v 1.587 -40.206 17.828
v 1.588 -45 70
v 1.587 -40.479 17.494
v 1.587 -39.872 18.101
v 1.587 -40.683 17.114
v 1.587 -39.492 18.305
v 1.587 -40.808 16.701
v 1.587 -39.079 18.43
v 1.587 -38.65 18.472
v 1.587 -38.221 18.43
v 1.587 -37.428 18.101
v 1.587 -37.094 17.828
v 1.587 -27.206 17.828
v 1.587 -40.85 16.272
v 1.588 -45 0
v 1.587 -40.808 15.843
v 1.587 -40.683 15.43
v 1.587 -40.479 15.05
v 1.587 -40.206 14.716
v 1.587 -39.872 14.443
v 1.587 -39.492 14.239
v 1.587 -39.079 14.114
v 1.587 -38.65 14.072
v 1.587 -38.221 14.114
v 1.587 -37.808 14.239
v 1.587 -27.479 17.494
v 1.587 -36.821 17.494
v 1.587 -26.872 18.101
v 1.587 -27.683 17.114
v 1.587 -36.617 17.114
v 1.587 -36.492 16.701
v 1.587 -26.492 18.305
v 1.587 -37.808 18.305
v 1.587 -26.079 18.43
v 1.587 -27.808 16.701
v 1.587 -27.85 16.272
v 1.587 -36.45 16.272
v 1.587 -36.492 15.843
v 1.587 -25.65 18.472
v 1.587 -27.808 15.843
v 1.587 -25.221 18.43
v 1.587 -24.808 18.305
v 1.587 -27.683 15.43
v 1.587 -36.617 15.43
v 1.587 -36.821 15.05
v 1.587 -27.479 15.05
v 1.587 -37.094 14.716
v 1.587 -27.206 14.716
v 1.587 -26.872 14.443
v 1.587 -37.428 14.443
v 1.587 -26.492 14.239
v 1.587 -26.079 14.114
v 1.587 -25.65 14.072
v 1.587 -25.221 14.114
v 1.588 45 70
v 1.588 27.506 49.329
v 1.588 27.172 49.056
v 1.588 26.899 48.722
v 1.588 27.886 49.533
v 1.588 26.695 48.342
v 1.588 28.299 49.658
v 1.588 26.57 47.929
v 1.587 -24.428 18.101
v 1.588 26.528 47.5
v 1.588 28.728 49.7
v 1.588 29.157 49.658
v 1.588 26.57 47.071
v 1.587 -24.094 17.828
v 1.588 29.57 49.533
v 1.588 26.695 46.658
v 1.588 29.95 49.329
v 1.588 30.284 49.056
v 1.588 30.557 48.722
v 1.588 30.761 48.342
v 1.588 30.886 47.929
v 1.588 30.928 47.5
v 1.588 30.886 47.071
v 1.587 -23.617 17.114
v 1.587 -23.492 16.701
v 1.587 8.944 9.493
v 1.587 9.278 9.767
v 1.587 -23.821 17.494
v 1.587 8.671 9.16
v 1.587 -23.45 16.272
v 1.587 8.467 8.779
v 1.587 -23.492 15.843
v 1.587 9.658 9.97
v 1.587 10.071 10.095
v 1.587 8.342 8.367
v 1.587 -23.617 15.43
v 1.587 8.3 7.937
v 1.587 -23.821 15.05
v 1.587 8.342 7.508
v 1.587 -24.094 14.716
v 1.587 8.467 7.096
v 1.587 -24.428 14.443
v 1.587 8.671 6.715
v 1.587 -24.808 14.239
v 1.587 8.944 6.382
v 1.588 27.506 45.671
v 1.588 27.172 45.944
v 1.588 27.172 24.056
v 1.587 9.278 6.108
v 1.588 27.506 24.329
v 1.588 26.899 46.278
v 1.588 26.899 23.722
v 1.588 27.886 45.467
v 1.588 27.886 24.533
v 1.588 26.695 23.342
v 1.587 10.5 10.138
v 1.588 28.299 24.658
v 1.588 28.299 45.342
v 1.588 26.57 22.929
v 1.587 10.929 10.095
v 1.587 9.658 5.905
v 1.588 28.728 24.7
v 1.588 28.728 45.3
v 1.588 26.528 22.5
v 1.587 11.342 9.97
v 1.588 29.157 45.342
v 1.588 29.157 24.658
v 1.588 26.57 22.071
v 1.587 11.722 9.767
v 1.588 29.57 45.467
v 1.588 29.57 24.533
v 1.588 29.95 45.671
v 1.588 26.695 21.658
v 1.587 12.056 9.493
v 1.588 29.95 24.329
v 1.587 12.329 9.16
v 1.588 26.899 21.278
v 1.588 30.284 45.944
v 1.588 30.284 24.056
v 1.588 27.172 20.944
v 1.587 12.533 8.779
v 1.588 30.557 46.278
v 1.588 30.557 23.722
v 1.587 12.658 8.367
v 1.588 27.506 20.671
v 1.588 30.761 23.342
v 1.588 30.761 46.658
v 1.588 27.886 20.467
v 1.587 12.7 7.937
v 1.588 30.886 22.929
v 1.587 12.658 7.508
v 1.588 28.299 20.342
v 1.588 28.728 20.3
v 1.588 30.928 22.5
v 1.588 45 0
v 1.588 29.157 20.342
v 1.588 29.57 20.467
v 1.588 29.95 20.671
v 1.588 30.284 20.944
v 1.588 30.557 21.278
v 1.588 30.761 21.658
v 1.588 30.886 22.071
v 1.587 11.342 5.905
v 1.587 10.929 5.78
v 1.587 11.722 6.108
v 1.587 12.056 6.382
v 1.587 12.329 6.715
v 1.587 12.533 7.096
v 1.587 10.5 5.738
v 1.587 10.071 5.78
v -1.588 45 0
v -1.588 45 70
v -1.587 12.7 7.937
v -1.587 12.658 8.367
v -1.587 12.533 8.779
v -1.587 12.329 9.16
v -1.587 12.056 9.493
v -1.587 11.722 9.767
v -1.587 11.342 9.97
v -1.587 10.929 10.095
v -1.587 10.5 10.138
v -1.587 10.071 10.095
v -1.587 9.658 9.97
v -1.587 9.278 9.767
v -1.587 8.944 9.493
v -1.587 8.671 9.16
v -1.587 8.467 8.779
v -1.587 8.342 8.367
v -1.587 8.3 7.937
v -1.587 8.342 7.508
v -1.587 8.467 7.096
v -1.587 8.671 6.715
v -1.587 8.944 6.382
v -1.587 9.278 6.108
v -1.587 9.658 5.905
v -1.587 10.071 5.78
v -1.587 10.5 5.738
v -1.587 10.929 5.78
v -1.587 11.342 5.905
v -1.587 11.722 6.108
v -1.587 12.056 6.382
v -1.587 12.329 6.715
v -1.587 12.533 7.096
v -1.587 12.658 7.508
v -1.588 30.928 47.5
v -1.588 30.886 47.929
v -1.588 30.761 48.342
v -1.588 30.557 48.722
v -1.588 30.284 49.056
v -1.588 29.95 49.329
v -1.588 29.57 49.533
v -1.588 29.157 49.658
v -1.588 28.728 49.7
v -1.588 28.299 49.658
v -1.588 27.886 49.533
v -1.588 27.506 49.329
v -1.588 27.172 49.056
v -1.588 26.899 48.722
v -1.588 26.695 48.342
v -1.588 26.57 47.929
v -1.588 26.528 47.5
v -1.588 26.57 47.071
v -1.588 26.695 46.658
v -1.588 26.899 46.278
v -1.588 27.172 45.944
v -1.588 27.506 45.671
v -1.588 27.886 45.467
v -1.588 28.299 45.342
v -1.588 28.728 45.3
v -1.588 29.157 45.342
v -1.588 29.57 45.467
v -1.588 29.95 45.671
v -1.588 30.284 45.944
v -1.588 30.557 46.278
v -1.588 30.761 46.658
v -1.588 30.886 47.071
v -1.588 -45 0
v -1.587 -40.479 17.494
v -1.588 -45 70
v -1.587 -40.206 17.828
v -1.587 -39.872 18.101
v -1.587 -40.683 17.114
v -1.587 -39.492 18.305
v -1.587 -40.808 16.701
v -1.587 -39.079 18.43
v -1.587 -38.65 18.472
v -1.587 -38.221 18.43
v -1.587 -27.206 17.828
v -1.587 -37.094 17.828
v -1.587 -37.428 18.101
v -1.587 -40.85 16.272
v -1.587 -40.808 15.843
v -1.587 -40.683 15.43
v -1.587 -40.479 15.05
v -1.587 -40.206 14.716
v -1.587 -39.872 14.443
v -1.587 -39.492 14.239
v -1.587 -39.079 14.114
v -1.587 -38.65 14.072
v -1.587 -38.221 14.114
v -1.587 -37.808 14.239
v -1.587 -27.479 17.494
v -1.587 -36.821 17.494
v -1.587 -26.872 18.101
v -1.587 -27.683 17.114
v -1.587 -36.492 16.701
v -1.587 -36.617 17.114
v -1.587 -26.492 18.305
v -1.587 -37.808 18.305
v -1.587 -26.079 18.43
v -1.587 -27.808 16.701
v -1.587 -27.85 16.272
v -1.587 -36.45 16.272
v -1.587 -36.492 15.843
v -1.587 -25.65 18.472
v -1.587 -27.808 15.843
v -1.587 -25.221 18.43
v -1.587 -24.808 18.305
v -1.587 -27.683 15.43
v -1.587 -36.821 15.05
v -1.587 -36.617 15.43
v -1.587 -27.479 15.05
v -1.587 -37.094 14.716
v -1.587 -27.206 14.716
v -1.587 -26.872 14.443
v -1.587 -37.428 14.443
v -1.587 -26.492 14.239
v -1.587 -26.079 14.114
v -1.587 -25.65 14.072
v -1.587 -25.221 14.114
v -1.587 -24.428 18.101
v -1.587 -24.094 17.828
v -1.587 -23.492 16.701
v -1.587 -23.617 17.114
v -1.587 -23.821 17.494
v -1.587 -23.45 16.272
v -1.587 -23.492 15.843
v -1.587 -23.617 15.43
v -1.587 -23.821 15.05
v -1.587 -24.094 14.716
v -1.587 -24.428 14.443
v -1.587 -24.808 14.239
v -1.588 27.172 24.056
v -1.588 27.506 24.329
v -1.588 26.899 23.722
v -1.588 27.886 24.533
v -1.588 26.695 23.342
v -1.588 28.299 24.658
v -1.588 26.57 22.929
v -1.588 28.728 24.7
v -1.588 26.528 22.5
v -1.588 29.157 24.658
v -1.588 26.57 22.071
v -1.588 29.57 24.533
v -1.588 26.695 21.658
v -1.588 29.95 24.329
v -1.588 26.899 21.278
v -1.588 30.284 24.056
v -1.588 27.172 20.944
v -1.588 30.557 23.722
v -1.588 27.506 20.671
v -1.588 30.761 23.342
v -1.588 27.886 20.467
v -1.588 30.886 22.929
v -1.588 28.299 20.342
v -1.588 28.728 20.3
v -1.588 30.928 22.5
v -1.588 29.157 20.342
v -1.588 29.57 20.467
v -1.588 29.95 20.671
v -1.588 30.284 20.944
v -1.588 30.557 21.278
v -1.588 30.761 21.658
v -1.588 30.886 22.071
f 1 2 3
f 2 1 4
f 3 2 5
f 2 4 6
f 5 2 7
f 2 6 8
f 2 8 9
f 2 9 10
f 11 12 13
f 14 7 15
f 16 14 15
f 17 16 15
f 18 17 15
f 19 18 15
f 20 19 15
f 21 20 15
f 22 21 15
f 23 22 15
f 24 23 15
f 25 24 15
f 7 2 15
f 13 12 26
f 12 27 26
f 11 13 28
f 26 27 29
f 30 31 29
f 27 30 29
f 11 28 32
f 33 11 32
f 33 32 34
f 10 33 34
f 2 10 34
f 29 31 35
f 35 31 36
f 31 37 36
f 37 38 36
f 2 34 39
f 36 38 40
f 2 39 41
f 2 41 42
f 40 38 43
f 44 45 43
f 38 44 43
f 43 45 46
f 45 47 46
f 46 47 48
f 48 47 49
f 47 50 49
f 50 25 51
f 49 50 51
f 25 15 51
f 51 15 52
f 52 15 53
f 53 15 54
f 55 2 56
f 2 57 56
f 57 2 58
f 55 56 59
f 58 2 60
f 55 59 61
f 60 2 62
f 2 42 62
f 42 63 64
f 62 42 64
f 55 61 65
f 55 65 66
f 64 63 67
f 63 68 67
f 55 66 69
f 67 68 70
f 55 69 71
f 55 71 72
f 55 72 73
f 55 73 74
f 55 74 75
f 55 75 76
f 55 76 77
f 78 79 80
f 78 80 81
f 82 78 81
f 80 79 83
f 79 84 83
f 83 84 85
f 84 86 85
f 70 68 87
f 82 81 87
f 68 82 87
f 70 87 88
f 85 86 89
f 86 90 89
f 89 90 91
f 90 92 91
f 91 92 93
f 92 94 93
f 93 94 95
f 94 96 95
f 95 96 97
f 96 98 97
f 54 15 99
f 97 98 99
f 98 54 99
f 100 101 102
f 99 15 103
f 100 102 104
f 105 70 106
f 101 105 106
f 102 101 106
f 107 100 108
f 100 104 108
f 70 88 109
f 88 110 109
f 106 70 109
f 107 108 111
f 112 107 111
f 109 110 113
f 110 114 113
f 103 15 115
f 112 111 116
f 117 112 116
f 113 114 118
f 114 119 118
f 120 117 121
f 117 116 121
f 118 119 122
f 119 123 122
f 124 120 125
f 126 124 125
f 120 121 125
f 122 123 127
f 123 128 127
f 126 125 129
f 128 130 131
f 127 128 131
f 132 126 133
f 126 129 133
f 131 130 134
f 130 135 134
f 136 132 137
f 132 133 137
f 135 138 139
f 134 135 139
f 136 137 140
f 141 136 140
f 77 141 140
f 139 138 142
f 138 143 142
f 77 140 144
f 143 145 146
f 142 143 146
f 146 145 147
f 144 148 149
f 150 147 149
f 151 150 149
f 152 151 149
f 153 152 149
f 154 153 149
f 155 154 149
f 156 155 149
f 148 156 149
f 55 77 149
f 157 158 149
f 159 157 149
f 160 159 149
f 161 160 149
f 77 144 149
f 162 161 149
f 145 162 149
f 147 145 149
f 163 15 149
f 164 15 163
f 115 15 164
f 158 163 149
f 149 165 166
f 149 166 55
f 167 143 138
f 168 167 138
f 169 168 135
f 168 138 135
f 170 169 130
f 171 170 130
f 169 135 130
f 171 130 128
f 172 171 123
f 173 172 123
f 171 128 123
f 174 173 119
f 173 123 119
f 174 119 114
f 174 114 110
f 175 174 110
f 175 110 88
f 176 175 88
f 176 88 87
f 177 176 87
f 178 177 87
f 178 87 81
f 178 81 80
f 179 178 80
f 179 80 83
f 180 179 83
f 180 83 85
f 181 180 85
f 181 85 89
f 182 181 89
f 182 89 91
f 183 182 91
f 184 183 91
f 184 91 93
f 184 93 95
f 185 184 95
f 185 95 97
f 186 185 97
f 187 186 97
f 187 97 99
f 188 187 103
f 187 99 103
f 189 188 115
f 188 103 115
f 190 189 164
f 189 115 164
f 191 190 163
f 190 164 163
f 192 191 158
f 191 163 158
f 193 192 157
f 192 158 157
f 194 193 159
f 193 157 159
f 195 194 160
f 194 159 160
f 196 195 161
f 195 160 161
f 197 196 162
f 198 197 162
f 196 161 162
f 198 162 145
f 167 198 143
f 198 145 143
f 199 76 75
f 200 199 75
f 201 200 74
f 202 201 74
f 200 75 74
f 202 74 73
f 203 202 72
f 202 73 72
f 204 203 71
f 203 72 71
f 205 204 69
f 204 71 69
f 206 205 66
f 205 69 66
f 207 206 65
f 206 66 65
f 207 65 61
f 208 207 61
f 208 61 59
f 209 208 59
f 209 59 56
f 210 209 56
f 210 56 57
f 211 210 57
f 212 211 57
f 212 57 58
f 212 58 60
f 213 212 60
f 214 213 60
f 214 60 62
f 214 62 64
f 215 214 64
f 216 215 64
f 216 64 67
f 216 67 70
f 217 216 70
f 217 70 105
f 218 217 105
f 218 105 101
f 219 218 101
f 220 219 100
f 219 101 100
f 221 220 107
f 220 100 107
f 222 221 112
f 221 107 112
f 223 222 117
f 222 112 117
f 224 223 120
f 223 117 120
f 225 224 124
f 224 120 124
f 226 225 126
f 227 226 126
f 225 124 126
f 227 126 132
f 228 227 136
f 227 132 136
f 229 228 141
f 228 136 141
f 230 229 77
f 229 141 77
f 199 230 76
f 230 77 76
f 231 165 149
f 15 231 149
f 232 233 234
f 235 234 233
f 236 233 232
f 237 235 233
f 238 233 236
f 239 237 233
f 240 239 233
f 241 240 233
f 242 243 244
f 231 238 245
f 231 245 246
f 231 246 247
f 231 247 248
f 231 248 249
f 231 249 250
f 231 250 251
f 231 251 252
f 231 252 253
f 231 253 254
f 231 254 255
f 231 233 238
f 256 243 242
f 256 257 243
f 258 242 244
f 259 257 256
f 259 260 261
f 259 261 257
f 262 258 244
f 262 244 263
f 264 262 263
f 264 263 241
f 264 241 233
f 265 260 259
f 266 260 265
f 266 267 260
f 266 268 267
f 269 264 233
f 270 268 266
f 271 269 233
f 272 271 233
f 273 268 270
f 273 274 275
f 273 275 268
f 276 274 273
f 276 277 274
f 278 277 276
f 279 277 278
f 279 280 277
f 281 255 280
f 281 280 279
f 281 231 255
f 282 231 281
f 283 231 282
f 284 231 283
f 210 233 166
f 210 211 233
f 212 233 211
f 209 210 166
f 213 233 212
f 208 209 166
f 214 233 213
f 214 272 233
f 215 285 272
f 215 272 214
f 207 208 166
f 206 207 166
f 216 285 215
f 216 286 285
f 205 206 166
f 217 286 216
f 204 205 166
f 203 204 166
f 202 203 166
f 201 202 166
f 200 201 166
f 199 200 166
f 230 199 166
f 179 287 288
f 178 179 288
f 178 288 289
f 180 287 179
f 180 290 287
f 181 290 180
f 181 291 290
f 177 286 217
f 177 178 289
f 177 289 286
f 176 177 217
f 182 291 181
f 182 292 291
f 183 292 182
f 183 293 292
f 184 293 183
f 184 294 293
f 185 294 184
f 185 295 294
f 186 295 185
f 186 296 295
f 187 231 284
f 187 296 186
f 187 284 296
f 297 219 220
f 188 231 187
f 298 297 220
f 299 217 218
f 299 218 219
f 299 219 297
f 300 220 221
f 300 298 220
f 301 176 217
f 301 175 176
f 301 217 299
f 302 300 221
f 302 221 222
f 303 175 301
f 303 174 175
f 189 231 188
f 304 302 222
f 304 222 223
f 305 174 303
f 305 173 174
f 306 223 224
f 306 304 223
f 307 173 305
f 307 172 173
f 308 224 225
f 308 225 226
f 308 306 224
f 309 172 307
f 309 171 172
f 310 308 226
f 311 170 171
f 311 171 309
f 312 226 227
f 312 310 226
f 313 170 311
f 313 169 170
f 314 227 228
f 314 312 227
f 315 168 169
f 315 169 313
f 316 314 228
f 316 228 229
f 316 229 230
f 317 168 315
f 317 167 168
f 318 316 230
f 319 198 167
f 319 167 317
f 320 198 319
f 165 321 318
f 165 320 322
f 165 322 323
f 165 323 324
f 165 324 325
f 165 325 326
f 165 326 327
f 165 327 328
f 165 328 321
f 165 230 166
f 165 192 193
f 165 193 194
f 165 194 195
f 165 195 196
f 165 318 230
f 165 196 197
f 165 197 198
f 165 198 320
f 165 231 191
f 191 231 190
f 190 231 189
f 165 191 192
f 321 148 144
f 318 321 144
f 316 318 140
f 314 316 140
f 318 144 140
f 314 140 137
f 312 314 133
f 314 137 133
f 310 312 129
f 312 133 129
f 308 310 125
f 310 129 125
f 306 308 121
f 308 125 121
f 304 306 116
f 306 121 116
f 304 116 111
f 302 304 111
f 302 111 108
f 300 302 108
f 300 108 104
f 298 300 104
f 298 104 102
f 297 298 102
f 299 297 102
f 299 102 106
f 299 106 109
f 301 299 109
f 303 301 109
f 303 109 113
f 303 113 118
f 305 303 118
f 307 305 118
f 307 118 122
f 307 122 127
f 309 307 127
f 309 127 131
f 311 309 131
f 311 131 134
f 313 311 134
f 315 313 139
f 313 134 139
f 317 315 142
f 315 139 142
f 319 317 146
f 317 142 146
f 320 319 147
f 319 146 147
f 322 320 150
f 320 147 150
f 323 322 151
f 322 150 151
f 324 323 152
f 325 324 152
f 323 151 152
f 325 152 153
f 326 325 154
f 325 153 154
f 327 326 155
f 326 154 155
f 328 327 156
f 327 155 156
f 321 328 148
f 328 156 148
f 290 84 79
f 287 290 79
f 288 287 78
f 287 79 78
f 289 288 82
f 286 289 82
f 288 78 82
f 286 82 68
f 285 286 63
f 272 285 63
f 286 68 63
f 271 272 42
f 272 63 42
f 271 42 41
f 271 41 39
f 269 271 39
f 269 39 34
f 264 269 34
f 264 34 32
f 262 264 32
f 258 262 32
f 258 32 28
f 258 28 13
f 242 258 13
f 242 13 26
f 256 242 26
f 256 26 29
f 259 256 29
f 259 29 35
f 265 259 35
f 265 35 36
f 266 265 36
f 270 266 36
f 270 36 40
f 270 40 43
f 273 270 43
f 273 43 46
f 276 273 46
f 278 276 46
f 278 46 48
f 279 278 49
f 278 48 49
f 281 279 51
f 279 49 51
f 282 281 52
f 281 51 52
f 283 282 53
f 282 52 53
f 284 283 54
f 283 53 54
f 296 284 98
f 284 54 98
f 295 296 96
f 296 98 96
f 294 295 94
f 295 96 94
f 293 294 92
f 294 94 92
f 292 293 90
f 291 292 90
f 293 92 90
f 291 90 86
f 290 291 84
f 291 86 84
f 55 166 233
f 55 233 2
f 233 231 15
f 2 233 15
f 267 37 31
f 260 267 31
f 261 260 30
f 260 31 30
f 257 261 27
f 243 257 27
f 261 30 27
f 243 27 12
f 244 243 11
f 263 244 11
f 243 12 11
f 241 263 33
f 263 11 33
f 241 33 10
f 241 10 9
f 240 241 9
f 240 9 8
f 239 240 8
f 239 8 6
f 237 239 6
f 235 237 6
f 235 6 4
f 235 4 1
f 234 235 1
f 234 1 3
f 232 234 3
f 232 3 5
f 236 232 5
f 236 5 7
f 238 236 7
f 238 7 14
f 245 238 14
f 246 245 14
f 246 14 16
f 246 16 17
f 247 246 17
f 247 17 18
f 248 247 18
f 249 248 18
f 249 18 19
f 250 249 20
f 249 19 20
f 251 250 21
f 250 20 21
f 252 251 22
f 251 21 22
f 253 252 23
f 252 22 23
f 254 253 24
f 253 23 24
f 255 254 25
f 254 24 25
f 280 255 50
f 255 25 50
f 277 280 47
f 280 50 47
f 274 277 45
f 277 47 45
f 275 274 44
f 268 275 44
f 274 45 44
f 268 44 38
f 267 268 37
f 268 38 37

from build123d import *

# Parameters (mm, degrees)
F0_W     = 3.175
F0_H     = 90
F1_DEPTH = 70
F3_D     = 4.4
F5_D     = 4.4
F5_DEPTH = 25
F5_TIP   = 1.3218933619


with BuildPart() as f1:
    # F0 (on Top) → F1 (new body)
    with BuildSketch(Plane.XY):
        Rectangle(F0_W, F0_H)
    extrude(amount=F1_DEPTH)

    # F3 (through all)
    with Locations(Plane(origin=(-1.5875, 0, 0), x_dir=(0, -1, 0), z_dir=(-1, 0, 0))):
        with Locations((-28.728, 47.5), (-28.728, 22.5)):
            Hole(F3_D / 2)

    # F5
    with Locations(Plane(origin=(-1.5875, 0, 0), x_dir=(0, -1, 0), z_dir=(-1, 0, 0))):
        with Locations((38.65, 16.272), (25.65, 16.272), (-10.5, 7.9375)):
            Hole(F5_D / 2, depth=F5_DEPTH)
            with Locations((0, 0, -(F5_DEPTH + F5_TIP / 2))):  # 118° drill point
                Cone(0, F5_D / 2, F5_TIP, mode=Mode.SUBTRACT)


solid = f1.part
